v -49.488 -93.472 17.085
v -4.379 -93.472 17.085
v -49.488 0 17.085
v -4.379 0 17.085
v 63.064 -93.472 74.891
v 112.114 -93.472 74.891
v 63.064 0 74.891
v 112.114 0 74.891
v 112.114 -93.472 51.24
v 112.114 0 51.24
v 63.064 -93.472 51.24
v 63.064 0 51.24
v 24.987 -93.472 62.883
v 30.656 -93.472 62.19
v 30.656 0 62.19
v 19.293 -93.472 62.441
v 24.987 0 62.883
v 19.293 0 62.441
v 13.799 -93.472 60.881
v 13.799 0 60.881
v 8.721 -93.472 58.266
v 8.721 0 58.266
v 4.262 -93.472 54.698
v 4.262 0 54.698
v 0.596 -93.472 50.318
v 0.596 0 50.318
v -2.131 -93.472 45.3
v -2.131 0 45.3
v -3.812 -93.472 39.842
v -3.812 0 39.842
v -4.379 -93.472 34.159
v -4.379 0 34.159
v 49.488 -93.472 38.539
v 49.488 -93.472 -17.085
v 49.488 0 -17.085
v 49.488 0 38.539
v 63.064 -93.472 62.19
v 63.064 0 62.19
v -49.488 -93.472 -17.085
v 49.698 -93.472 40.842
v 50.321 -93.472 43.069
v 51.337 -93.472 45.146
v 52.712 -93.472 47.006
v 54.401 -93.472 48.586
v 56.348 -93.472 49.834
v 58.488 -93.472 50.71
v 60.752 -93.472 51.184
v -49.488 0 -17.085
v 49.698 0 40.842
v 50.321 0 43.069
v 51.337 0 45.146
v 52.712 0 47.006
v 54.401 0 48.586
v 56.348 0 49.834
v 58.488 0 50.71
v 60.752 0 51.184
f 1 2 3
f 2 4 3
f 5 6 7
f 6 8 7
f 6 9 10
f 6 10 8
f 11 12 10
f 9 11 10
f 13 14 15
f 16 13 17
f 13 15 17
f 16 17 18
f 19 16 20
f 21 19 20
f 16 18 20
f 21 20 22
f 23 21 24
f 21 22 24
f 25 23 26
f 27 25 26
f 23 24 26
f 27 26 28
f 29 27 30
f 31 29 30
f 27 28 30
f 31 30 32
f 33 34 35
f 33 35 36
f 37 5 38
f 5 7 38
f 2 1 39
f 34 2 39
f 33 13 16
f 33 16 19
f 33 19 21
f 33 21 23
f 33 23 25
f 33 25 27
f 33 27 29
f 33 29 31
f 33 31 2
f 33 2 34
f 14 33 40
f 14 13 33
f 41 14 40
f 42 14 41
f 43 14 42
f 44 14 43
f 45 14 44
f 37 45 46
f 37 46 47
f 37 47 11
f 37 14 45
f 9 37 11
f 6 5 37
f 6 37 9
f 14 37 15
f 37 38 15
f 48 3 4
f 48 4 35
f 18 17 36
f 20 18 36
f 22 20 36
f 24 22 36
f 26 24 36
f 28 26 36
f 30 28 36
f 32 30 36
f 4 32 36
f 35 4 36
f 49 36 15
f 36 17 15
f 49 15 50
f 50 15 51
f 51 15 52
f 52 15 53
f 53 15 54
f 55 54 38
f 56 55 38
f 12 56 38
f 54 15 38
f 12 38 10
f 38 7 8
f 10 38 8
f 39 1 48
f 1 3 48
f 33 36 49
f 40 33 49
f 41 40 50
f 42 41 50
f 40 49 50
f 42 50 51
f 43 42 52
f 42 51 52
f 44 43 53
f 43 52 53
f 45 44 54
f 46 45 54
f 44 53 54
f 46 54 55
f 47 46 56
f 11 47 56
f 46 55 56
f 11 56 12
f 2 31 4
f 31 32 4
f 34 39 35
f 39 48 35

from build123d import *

# Parameters (mm, degrees)
F1_DEPTH = 68.072
F2_DEPTH = 25.4


with BuildPart() as f1:
    # F0 (on Front) → F1 (new body)
    with BuildSketch(Plane.XZ):
        Polygon((63.0641430616, 62.1895045042), (63.0641430616, 51.2399822474), (112.1140122414, 51.2399822474), (112.1140122414, 74.8909711838), (63.0641430616, 74.8909711838), align=None)
        Polygon((-49.4878217578, -17.0850455761), (49.4878217578, -17.0850455761), (49.4878217578, 17.0850455761), (-4.3794501107, 17.0850455761), (-49.4878217578, 17.0850455761), align=None)
        with BuildLine():
            Line((-4.3794501107, 17.0850455761), (49.4878217578, 17.0850455761))
            Line((49.4878217578, 17.0850455761), (49.4878217578, 38.5385379195))
            ThreePointArc((49.4878217578, 38.5385379195), (53.5207448585, 47.8342787205), (63.0641430616, 51.2399822474))
            Line((63.0641430616, 51.2399822474), (63.0641430616, 62.1895045042))
            Line((63.0641430616, 62.1895045042), (30.6561756879, 62.1895045042))
            ThreePointArc((30.6561756879, 62.1895045042), (6.4025600383, 56.5931809269), (-4.3794501107, 34.1587215662))
            Line((-4.3794501107, 34.1587215662), (-4.3794501107, 17.0850455761))
        make_face()
    extrude(amount=F1_DEPTH)

    # F2 (add): a face of the model
    f2_faces = [f1.faces().sort_by_distance(p)[0] for p in [
        (23.7821651341, -68.072, 24.4260783553),
    ]]
    extrude(f2_faces, amount=F2_DEPTH)


solid = f1.part
